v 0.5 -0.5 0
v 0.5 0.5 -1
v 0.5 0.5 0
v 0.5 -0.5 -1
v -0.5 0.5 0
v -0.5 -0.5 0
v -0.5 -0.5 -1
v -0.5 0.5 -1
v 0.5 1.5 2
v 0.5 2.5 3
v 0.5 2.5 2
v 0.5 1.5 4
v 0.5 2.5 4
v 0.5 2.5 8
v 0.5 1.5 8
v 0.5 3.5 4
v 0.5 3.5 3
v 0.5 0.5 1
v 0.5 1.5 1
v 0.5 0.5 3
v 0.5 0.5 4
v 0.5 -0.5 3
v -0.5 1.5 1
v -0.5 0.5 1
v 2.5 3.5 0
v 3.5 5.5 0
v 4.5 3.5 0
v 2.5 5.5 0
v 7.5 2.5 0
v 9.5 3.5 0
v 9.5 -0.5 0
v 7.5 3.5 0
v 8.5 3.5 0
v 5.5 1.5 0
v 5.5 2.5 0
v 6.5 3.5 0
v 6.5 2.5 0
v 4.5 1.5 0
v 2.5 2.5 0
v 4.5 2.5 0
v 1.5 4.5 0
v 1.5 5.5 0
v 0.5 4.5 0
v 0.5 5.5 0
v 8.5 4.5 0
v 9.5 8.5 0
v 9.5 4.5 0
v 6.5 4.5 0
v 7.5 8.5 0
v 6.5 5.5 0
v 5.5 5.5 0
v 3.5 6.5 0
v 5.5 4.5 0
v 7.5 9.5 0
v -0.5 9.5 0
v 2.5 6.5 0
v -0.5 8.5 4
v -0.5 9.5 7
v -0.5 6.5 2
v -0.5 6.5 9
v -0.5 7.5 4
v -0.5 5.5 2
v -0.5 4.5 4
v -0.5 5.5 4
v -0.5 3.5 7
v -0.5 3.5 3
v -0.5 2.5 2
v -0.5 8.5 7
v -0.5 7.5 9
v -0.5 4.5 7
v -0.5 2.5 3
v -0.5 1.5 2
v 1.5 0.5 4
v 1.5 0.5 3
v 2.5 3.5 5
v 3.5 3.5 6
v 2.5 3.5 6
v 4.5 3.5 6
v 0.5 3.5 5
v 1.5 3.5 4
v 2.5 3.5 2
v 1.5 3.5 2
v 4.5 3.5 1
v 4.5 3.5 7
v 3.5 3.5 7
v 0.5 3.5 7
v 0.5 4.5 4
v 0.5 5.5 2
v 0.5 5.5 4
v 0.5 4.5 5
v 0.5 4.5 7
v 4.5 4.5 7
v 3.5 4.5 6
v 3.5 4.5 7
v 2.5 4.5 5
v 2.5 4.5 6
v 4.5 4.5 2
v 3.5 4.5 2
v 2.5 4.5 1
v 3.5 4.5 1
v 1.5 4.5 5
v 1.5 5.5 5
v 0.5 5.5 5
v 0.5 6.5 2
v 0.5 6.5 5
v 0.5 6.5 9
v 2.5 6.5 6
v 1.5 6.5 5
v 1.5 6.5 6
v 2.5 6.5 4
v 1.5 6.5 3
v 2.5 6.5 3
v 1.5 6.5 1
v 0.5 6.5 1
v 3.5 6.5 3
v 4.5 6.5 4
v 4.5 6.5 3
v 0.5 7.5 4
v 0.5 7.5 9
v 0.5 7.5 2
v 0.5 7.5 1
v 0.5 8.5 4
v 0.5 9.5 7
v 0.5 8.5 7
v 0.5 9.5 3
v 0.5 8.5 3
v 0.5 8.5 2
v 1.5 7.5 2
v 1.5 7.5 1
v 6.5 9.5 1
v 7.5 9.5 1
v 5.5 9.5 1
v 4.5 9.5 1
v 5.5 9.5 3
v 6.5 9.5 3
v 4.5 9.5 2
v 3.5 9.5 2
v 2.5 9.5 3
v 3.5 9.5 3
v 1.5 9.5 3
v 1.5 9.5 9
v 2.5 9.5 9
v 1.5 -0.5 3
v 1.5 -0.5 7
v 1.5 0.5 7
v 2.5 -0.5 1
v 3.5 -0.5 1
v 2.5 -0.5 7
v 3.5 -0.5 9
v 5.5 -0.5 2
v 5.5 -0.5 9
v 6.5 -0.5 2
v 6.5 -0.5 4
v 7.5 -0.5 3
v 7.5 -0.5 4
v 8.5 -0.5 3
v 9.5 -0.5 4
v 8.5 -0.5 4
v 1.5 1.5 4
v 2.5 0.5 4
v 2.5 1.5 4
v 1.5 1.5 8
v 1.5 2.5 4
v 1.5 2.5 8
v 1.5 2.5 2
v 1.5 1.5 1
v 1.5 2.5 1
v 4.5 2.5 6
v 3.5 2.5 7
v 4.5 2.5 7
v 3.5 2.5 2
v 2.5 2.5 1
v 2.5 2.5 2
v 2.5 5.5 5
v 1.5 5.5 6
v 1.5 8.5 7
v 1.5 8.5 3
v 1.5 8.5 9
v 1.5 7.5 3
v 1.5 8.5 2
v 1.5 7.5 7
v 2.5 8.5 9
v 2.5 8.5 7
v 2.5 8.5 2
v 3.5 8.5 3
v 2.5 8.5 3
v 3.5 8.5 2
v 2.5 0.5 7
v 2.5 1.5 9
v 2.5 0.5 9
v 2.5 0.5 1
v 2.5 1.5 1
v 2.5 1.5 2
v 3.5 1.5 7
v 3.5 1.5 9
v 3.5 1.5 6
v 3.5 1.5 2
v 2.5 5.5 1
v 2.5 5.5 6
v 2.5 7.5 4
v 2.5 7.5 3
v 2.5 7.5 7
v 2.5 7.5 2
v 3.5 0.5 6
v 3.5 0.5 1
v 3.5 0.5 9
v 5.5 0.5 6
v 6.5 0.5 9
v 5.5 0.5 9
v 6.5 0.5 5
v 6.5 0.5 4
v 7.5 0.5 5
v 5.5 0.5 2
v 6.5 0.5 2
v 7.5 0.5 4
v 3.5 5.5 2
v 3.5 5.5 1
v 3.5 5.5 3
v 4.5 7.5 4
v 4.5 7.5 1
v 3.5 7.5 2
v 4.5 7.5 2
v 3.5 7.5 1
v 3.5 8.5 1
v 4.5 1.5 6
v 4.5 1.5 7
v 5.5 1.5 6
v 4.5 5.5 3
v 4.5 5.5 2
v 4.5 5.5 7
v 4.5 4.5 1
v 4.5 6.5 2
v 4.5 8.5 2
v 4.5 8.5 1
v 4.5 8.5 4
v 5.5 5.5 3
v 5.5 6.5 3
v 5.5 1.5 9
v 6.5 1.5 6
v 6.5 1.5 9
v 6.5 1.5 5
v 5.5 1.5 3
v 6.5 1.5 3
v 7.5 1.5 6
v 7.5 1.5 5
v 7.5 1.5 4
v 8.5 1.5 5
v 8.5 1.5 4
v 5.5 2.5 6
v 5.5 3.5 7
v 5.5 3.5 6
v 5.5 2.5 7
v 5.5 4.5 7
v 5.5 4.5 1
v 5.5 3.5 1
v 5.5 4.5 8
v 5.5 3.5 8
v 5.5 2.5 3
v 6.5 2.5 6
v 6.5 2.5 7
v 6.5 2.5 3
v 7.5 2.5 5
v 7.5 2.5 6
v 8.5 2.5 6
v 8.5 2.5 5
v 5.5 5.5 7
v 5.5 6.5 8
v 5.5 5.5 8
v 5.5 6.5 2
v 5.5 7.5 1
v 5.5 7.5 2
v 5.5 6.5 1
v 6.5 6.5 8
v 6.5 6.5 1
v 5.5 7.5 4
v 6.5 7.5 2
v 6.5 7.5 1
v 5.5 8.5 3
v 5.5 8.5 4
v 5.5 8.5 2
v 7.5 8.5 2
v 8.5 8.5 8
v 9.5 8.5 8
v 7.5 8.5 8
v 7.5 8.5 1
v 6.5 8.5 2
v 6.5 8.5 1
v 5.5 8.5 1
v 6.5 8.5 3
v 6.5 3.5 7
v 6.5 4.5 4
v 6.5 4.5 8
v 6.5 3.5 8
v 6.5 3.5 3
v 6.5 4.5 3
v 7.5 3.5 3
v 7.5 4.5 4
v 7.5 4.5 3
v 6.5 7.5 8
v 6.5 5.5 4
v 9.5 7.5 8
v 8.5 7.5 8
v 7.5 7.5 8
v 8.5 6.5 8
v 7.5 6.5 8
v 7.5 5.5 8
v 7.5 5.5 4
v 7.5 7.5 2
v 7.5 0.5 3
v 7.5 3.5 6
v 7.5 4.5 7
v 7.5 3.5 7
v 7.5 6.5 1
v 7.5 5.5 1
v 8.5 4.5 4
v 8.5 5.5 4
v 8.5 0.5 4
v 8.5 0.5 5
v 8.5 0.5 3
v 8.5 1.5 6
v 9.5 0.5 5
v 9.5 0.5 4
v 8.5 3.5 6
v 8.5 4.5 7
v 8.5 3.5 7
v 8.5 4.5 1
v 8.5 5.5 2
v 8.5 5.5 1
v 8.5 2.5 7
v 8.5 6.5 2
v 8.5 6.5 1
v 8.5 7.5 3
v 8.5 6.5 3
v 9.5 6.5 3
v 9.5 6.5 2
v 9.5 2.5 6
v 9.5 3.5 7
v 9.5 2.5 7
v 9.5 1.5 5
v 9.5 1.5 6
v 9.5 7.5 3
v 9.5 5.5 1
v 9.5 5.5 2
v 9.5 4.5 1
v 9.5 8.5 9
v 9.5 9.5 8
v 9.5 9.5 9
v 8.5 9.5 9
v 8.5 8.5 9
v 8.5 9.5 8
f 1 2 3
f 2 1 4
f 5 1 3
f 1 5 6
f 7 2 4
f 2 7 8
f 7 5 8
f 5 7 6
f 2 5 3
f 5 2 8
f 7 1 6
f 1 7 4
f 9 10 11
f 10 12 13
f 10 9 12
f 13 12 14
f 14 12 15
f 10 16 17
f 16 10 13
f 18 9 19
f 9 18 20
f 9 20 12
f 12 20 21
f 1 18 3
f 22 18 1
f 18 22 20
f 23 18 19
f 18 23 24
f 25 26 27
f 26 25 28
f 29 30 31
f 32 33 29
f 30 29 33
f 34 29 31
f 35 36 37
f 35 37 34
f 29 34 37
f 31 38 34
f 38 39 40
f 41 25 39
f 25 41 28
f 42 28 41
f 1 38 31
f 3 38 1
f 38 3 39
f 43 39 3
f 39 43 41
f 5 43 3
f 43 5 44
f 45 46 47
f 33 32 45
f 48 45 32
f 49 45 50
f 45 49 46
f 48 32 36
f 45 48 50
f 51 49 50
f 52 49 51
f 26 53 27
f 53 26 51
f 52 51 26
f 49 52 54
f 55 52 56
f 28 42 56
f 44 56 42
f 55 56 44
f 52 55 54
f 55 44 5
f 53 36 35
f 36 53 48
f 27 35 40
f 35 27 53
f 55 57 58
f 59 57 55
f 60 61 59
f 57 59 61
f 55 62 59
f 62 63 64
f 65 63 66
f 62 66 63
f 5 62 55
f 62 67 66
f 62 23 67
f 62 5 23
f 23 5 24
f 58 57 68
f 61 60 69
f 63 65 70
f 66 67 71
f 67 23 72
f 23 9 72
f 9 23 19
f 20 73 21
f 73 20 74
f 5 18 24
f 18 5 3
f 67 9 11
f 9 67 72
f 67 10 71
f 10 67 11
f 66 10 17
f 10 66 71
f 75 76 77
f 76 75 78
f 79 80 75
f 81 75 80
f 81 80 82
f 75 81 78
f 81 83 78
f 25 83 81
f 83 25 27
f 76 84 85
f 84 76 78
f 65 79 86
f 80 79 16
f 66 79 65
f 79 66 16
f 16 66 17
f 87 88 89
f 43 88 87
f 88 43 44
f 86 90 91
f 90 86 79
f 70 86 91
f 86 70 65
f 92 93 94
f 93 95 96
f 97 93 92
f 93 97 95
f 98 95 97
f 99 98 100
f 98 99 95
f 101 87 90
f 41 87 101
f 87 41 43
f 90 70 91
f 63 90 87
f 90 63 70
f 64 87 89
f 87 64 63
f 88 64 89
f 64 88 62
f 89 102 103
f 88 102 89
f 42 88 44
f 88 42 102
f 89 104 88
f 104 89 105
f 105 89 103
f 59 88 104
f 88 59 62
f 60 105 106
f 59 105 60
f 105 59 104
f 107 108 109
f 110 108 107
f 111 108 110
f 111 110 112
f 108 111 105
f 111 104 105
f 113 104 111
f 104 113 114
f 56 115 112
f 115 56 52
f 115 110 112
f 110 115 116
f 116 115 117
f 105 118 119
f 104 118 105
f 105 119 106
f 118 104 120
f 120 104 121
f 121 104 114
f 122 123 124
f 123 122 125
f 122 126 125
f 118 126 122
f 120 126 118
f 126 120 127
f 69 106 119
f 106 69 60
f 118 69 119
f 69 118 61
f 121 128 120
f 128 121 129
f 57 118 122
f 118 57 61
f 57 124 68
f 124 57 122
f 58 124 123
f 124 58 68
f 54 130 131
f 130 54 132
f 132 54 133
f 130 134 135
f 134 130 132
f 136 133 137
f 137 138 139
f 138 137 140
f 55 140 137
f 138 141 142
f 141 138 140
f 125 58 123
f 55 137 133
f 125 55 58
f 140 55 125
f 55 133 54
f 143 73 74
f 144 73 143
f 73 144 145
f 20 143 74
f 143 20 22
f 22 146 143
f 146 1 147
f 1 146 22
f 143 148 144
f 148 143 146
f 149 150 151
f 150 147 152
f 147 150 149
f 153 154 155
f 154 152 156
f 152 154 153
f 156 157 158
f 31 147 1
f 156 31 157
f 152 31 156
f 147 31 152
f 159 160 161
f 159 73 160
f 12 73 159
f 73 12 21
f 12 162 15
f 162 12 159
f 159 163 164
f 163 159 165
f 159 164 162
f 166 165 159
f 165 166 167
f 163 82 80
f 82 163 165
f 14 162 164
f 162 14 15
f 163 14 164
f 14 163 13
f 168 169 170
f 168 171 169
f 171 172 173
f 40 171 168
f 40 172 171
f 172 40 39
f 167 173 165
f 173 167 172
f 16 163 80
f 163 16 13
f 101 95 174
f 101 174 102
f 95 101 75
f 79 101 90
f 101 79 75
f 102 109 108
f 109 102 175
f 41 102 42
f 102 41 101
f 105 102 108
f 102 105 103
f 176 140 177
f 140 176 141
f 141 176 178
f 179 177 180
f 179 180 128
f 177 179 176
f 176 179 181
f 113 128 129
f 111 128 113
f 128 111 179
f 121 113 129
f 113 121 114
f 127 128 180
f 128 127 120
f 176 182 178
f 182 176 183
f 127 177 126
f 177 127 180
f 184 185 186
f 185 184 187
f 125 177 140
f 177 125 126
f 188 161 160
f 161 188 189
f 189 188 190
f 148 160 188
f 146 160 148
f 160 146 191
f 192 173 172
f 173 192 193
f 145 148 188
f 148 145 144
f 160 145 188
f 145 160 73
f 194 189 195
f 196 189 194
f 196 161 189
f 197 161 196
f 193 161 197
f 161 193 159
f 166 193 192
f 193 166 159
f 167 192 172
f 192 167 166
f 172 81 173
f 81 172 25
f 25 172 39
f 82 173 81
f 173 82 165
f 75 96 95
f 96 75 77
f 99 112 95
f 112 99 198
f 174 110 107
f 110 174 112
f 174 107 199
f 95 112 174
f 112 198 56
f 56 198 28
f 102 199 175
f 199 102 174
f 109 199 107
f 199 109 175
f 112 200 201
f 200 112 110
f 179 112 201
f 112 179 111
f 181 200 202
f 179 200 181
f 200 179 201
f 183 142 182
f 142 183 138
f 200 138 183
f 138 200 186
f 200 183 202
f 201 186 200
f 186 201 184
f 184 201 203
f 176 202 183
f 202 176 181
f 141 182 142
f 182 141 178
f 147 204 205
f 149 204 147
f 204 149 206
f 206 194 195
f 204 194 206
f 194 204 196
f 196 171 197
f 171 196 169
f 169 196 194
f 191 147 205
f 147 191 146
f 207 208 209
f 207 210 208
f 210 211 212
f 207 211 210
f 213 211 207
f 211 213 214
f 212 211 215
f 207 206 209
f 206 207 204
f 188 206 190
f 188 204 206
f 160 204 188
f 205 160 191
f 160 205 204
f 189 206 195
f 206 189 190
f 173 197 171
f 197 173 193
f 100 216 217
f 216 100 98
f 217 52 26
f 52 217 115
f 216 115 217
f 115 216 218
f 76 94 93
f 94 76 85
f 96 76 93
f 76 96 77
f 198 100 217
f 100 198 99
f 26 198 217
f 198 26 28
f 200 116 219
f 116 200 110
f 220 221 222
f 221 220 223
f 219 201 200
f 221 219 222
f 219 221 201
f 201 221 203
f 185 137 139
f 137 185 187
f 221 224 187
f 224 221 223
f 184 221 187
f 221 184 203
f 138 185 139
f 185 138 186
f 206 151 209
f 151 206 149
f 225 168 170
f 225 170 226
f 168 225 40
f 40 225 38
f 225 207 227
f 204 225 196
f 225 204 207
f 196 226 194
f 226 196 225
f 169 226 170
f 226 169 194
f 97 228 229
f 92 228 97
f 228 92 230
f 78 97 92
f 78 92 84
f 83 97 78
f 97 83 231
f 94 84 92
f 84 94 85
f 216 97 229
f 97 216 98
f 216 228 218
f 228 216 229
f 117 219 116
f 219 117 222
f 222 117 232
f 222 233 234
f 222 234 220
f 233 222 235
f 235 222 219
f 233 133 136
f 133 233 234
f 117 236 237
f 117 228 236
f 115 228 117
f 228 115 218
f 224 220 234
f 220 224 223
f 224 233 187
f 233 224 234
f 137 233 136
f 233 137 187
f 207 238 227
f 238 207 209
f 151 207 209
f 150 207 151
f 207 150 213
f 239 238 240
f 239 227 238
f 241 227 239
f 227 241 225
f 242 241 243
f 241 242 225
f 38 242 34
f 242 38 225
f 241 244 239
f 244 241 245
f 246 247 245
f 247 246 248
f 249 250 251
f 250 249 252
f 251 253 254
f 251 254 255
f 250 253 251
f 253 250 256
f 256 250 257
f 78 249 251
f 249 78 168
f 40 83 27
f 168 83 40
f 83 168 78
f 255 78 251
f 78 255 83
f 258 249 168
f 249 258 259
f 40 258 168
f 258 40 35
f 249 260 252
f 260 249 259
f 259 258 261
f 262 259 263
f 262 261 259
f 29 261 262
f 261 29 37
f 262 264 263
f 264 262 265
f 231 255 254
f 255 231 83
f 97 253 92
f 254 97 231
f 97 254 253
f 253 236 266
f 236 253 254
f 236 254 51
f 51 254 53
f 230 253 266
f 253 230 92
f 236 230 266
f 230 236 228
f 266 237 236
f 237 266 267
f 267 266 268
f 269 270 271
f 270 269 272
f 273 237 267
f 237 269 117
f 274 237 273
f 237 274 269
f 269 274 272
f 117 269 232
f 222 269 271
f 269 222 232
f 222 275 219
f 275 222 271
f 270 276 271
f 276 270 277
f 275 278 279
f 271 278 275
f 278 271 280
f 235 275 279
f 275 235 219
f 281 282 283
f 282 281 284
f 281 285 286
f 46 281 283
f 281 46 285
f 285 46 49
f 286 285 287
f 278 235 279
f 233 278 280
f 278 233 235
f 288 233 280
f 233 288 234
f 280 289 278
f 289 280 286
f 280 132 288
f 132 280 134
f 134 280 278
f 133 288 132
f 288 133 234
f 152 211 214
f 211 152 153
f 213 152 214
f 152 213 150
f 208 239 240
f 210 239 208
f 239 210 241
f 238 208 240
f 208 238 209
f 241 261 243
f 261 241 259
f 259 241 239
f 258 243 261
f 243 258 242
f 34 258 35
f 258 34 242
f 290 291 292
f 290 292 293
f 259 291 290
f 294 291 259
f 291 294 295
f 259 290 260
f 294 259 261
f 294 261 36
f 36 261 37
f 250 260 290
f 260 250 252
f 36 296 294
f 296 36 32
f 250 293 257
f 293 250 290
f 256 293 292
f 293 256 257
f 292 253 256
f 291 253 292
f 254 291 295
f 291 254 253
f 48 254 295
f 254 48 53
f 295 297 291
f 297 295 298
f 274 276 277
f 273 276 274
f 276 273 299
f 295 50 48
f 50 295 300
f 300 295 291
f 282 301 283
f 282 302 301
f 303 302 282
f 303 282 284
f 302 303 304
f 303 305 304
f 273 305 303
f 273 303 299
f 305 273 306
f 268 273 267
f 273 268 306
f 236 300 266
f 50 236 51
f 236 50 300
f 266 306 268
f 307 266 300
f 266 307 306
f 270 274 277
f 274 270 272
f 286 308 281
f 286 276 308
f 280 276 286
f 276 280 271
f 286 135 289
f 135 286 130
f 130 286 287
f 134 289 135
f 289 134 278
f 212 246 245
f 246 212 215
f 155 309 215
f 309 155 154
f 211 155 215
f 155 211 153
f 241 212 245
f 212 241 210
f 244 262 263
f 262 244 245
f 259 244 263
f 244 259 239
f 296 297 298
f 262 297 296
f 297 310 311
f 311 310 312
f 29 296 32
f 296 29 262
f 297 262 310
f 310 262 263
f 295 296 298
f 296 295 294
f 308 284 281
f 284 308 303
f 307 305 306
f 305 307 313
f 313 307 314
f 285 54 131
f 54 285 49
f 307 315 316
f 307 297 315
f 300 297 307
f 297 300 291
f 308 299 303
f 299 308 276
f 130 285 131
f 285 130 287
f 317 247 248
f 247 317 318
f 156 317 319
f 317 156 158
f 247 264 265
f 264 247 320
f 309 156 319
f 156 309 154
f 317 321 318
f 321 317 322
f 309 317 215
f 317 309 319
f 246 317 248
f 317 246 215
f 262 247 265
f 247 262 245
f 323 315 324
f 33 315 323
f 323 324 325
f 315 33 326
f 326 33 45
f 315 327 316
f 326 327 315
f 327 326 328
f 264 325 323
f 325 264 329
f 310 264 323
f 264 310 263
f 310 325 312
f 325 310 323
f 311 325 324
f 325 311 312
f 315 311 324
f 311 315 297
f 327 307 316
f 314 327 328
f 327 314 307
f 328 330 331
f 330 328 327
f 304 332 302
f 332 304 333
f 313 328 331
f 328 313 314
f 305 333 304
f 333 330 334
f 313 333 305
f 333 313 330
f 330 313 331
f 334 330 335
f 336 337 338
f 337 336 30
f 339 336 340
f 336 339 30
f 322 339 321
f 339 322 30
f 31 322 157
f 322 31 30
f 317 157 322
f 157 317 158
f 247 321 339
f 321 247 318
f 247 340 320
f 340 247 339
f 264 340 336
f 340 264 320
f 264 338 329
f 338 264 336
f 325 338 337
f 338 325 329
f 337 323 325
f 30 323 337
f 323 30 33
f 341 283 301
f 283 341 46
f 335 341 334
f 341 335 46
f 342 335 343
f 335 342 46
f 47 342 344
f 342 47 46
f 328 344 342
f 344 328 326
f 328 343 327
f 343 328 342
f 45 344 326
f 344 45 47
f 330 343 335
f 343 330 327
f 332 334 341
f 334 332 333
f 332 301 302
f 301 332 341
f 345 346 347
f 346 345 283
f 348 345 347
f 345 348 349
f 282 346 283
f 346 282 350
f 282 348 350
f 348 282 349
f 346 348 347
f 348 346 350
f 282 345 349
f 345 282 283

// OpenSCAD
union() {
    translate([0, 0, -0.5]) color([1, 0, 0]) cube([1, 1, 1], center=true);
    translate([0, 1, 0.5]) cube([1, 1, 1], center=true);
    translate([0, 2, 1.0]) cube([1, 1, 2], center=true);
    translate([0, 3, 1.5]) cube([1, 1, 3], center=true);
    translate([0, 4, 3.5]) cube([1, 1, 7], center=true);
    translate([0, 5, 2.0]) cube([1, 1, 4], center=true);
    translate([0, 6, 1.0]) cube([1, 1, 2], center=true);
    translate([0, 7, 4.5]) cube([1, 1, 9], center=true);
    translate([0, 8, 2.0]) cube([1, 1, 4], center=true);
    translate([0, 9, 3.5]) cube([1, 1, 7], center=true);
    translate([1, 0, 1.5]) cube([1, 1, 3], center=true);
    translate([1, 1, 2.0]) cube([1, 1, 4], center=true);
    translate([1, 2, 4.0]) cube([1, 1, 8], center=true);
    translate([1, 3, 2.0]) cube([1, 1, 4], center=true);
    translate([1, 4, 2.5]) cube([1, 1, 5], center=true);
    translate([1, 6, 2.5]) cube([1, 1, 5], center=true);
    translate([1, 7, 0.5]) cube([1, 1, 1], center=true);
    translate([1, 8, 1.0]) cube([1, 1, 2], center=true);
    translate([1, 9, 1.5]) cube([1, 1, 3], center=true);
    translate([2, 0, 3.5]) cube([1, 1, 7], center=true);
    translate([2, 1, 2.0]) cube([1, 1, 4], center=true);
    translate([2, 2, 0.5]) cube([1, 1, 1], center=true);
    translate([2, 3, 1.0]) cube([1, 1, 2], center=true);
    translate([2, 4, 2.5]) cube([1, 1, 5], center=true);
    translate([2, 5, 2.5]) cube([1, 1, 5], center=true);
    translate([2, 6, 3.0]) cube([1, 1, 6], center=true);
    translate([2, 7, 1.5]) cube([1, 1, 3], center=true);
    translate([2, 8, 3.5]) cube([1, 1, 7], center=true);
    translate([2, 9, 4.5]) cube([1, 1, 9], center=true);
    translate([3, 0, 0.5]) cube([1, 1, 1], center=true);
    translate([3, 1, 4.5]) cube([1, 1, 9], center=true);
    translate([3, 2, 1.0]) cube([1, 1, 2], center=true);
    translate([3, 4, 3.0]) cube([1, 1, 6], center=true);
    translate([3, 5, 0.5]) cube([1, 1, 1], center=true);
    translate([3, 7, 2.0]) cube([1, 1, 4], center=true);
    translate([3, 8, 1.0]) cube([1, 1, 2], center=true);
    translate([3, 9, 1.5]) cube([1, 1, 3], center=true);
    translate([4, 0, 4.5]) cube([1, 1, 9], center=true);
    translate([4, 1, 3.0]) cube([1, 1, 6], center=true);
    translate([4, 2, 3.5]) cube([1, 1, 7], center=true);
    translate([4, 4, 3.5]) cube([1, 1, 7], center=true);
    translate([4, 5, 1.0]) cube([1, 1, 2], center=true);
    translate([4, 6, 1.5]) cube([1, 1, 3], center=true);
    translate([4, 7, 2.0]) cube([1, 1, 4], center=true);
    translate([4, 8, 0.5]) cube([1, 1, 1], center=true);
    translate([4, 9, 1.0]) cube([1, 1, 2], center=true);
    translate([5, 0, 4.5]) cube([1, 1, 9], center=true);
    translate([5, 1, 3.0]) cube([1, 1, 6], center=true);
    translate([5, 3, 3.0]) cube([1, 1, 6], center=true);
    translate([5, 4, 0.5]) cube([1, 1, 1], center=true);
    translate([5, 5, 3.5]) cube([1, 1, 7], center=true);
    translate([5, 6, 1.5]) cube([1, 1, 3], center=true);
    translate([5, 7, 1.0]) cube([1, 1, 2], center=true);
    translate([5, 8, 2.0]) cube([1, 1, 4], center=true);
    translate([5, 9, 0.5]) cube([1, 1, 1], center=true);
    translate([6, 0, 1.0]) cube([1, 1, 2], center=true);
    translate([6, 1, 4.5]) cube([1, 1, 9], center=true);
    translate([6, 2, 1.5]) cube([1, 1, 3], center=true);
    translate([6, 3, 3.5]) cube([1, 1, 7], center=true);
    translate([6, 4, 4.0]) cube([1, 1, 8], center=true);
    translate([6, 6, 4.0]) cube([1, 1, 8], center=true);
    translate([6, 7, 0.5]) cube([1, 1, 1], center=true);
    translate([6, 8, 1.0]) cube([1, 1, 2], center=true);
    translate([6, 9, 1.5]) cube([1, 1, 3], center=true);
    translate([7, 0, 2.0]) cube([1, 1, 4], center=true);
    translate([7, 1, 2.5]) cube([1, 1, 5], center=true);
    translate([7, 2, 3.0]) cube([1, 1, 6], center=true);
    translate([7, 4, 1.5]) cube([1, 1, 3], center=true);
    translate([7, 5, 2.0]) cube([1, 1, 4], center=true);
    translate([7, 6, 4.0]) cube([1, 1, 8], center=true);
    translate([7, 7, 4.0]) cube([1, 1, 8], center=true);
    translate([7, 8, 1.0]) cube([1, 1, 2], center=true);
    translate([7, 9, 0.5]) cube([1, 1, 1], center=true);
    translate([8, 0, 1.5]) cube([1, 1, 3], center=true);
    translate([8, 1, 2.0]) cube([1, 1, 4], center=true);
    translate([8, 2, 2.5]) cube([1, 1, 5], center=true);
    translate([8, 3, 3.0]) cube([1, 1, 6], center=true);
    translate([8, 4, 3.5]) cube([1, 1, 7], center=true);
    translate([8, 5, 2.0]) cube([1, 1, 4], center=true);
    translate([8, 6, 0.5]) cube([1, 1, 1], center=true);
    translate([8, 7, 4.0]) cube([1, 1, 8], center=true);
    translate([8, 8, 4.0]) cube([1, 1, 8], center=true);
    translate([9, 0, 2.0]) cube([1, 1, 4], center=true);
    translate([9, 1, 2.5]) cube([1, 1, 5], center=true);
    translate([9, 2, 3.0]) cube([1, 1, 6], center=true);
    translate([9, 3, 3.5]) cube([1, 1, 7], center=true);
    translate([9, 5, 0.5]) cube([1, 1, 1], center=true);
    translate([9, 6, 1.0]) cube([1, 1, 2], center=true);
    translate([9, 7, 1.5]) cube([1, 1, 3], center=true);
    translate([9, 8, 4.0]) cube([1, 1, 8], center=true);
    translate([9, 9, 8.5]) color([0, 0, 1]) cube([1, 1, 1], center=true);
}
